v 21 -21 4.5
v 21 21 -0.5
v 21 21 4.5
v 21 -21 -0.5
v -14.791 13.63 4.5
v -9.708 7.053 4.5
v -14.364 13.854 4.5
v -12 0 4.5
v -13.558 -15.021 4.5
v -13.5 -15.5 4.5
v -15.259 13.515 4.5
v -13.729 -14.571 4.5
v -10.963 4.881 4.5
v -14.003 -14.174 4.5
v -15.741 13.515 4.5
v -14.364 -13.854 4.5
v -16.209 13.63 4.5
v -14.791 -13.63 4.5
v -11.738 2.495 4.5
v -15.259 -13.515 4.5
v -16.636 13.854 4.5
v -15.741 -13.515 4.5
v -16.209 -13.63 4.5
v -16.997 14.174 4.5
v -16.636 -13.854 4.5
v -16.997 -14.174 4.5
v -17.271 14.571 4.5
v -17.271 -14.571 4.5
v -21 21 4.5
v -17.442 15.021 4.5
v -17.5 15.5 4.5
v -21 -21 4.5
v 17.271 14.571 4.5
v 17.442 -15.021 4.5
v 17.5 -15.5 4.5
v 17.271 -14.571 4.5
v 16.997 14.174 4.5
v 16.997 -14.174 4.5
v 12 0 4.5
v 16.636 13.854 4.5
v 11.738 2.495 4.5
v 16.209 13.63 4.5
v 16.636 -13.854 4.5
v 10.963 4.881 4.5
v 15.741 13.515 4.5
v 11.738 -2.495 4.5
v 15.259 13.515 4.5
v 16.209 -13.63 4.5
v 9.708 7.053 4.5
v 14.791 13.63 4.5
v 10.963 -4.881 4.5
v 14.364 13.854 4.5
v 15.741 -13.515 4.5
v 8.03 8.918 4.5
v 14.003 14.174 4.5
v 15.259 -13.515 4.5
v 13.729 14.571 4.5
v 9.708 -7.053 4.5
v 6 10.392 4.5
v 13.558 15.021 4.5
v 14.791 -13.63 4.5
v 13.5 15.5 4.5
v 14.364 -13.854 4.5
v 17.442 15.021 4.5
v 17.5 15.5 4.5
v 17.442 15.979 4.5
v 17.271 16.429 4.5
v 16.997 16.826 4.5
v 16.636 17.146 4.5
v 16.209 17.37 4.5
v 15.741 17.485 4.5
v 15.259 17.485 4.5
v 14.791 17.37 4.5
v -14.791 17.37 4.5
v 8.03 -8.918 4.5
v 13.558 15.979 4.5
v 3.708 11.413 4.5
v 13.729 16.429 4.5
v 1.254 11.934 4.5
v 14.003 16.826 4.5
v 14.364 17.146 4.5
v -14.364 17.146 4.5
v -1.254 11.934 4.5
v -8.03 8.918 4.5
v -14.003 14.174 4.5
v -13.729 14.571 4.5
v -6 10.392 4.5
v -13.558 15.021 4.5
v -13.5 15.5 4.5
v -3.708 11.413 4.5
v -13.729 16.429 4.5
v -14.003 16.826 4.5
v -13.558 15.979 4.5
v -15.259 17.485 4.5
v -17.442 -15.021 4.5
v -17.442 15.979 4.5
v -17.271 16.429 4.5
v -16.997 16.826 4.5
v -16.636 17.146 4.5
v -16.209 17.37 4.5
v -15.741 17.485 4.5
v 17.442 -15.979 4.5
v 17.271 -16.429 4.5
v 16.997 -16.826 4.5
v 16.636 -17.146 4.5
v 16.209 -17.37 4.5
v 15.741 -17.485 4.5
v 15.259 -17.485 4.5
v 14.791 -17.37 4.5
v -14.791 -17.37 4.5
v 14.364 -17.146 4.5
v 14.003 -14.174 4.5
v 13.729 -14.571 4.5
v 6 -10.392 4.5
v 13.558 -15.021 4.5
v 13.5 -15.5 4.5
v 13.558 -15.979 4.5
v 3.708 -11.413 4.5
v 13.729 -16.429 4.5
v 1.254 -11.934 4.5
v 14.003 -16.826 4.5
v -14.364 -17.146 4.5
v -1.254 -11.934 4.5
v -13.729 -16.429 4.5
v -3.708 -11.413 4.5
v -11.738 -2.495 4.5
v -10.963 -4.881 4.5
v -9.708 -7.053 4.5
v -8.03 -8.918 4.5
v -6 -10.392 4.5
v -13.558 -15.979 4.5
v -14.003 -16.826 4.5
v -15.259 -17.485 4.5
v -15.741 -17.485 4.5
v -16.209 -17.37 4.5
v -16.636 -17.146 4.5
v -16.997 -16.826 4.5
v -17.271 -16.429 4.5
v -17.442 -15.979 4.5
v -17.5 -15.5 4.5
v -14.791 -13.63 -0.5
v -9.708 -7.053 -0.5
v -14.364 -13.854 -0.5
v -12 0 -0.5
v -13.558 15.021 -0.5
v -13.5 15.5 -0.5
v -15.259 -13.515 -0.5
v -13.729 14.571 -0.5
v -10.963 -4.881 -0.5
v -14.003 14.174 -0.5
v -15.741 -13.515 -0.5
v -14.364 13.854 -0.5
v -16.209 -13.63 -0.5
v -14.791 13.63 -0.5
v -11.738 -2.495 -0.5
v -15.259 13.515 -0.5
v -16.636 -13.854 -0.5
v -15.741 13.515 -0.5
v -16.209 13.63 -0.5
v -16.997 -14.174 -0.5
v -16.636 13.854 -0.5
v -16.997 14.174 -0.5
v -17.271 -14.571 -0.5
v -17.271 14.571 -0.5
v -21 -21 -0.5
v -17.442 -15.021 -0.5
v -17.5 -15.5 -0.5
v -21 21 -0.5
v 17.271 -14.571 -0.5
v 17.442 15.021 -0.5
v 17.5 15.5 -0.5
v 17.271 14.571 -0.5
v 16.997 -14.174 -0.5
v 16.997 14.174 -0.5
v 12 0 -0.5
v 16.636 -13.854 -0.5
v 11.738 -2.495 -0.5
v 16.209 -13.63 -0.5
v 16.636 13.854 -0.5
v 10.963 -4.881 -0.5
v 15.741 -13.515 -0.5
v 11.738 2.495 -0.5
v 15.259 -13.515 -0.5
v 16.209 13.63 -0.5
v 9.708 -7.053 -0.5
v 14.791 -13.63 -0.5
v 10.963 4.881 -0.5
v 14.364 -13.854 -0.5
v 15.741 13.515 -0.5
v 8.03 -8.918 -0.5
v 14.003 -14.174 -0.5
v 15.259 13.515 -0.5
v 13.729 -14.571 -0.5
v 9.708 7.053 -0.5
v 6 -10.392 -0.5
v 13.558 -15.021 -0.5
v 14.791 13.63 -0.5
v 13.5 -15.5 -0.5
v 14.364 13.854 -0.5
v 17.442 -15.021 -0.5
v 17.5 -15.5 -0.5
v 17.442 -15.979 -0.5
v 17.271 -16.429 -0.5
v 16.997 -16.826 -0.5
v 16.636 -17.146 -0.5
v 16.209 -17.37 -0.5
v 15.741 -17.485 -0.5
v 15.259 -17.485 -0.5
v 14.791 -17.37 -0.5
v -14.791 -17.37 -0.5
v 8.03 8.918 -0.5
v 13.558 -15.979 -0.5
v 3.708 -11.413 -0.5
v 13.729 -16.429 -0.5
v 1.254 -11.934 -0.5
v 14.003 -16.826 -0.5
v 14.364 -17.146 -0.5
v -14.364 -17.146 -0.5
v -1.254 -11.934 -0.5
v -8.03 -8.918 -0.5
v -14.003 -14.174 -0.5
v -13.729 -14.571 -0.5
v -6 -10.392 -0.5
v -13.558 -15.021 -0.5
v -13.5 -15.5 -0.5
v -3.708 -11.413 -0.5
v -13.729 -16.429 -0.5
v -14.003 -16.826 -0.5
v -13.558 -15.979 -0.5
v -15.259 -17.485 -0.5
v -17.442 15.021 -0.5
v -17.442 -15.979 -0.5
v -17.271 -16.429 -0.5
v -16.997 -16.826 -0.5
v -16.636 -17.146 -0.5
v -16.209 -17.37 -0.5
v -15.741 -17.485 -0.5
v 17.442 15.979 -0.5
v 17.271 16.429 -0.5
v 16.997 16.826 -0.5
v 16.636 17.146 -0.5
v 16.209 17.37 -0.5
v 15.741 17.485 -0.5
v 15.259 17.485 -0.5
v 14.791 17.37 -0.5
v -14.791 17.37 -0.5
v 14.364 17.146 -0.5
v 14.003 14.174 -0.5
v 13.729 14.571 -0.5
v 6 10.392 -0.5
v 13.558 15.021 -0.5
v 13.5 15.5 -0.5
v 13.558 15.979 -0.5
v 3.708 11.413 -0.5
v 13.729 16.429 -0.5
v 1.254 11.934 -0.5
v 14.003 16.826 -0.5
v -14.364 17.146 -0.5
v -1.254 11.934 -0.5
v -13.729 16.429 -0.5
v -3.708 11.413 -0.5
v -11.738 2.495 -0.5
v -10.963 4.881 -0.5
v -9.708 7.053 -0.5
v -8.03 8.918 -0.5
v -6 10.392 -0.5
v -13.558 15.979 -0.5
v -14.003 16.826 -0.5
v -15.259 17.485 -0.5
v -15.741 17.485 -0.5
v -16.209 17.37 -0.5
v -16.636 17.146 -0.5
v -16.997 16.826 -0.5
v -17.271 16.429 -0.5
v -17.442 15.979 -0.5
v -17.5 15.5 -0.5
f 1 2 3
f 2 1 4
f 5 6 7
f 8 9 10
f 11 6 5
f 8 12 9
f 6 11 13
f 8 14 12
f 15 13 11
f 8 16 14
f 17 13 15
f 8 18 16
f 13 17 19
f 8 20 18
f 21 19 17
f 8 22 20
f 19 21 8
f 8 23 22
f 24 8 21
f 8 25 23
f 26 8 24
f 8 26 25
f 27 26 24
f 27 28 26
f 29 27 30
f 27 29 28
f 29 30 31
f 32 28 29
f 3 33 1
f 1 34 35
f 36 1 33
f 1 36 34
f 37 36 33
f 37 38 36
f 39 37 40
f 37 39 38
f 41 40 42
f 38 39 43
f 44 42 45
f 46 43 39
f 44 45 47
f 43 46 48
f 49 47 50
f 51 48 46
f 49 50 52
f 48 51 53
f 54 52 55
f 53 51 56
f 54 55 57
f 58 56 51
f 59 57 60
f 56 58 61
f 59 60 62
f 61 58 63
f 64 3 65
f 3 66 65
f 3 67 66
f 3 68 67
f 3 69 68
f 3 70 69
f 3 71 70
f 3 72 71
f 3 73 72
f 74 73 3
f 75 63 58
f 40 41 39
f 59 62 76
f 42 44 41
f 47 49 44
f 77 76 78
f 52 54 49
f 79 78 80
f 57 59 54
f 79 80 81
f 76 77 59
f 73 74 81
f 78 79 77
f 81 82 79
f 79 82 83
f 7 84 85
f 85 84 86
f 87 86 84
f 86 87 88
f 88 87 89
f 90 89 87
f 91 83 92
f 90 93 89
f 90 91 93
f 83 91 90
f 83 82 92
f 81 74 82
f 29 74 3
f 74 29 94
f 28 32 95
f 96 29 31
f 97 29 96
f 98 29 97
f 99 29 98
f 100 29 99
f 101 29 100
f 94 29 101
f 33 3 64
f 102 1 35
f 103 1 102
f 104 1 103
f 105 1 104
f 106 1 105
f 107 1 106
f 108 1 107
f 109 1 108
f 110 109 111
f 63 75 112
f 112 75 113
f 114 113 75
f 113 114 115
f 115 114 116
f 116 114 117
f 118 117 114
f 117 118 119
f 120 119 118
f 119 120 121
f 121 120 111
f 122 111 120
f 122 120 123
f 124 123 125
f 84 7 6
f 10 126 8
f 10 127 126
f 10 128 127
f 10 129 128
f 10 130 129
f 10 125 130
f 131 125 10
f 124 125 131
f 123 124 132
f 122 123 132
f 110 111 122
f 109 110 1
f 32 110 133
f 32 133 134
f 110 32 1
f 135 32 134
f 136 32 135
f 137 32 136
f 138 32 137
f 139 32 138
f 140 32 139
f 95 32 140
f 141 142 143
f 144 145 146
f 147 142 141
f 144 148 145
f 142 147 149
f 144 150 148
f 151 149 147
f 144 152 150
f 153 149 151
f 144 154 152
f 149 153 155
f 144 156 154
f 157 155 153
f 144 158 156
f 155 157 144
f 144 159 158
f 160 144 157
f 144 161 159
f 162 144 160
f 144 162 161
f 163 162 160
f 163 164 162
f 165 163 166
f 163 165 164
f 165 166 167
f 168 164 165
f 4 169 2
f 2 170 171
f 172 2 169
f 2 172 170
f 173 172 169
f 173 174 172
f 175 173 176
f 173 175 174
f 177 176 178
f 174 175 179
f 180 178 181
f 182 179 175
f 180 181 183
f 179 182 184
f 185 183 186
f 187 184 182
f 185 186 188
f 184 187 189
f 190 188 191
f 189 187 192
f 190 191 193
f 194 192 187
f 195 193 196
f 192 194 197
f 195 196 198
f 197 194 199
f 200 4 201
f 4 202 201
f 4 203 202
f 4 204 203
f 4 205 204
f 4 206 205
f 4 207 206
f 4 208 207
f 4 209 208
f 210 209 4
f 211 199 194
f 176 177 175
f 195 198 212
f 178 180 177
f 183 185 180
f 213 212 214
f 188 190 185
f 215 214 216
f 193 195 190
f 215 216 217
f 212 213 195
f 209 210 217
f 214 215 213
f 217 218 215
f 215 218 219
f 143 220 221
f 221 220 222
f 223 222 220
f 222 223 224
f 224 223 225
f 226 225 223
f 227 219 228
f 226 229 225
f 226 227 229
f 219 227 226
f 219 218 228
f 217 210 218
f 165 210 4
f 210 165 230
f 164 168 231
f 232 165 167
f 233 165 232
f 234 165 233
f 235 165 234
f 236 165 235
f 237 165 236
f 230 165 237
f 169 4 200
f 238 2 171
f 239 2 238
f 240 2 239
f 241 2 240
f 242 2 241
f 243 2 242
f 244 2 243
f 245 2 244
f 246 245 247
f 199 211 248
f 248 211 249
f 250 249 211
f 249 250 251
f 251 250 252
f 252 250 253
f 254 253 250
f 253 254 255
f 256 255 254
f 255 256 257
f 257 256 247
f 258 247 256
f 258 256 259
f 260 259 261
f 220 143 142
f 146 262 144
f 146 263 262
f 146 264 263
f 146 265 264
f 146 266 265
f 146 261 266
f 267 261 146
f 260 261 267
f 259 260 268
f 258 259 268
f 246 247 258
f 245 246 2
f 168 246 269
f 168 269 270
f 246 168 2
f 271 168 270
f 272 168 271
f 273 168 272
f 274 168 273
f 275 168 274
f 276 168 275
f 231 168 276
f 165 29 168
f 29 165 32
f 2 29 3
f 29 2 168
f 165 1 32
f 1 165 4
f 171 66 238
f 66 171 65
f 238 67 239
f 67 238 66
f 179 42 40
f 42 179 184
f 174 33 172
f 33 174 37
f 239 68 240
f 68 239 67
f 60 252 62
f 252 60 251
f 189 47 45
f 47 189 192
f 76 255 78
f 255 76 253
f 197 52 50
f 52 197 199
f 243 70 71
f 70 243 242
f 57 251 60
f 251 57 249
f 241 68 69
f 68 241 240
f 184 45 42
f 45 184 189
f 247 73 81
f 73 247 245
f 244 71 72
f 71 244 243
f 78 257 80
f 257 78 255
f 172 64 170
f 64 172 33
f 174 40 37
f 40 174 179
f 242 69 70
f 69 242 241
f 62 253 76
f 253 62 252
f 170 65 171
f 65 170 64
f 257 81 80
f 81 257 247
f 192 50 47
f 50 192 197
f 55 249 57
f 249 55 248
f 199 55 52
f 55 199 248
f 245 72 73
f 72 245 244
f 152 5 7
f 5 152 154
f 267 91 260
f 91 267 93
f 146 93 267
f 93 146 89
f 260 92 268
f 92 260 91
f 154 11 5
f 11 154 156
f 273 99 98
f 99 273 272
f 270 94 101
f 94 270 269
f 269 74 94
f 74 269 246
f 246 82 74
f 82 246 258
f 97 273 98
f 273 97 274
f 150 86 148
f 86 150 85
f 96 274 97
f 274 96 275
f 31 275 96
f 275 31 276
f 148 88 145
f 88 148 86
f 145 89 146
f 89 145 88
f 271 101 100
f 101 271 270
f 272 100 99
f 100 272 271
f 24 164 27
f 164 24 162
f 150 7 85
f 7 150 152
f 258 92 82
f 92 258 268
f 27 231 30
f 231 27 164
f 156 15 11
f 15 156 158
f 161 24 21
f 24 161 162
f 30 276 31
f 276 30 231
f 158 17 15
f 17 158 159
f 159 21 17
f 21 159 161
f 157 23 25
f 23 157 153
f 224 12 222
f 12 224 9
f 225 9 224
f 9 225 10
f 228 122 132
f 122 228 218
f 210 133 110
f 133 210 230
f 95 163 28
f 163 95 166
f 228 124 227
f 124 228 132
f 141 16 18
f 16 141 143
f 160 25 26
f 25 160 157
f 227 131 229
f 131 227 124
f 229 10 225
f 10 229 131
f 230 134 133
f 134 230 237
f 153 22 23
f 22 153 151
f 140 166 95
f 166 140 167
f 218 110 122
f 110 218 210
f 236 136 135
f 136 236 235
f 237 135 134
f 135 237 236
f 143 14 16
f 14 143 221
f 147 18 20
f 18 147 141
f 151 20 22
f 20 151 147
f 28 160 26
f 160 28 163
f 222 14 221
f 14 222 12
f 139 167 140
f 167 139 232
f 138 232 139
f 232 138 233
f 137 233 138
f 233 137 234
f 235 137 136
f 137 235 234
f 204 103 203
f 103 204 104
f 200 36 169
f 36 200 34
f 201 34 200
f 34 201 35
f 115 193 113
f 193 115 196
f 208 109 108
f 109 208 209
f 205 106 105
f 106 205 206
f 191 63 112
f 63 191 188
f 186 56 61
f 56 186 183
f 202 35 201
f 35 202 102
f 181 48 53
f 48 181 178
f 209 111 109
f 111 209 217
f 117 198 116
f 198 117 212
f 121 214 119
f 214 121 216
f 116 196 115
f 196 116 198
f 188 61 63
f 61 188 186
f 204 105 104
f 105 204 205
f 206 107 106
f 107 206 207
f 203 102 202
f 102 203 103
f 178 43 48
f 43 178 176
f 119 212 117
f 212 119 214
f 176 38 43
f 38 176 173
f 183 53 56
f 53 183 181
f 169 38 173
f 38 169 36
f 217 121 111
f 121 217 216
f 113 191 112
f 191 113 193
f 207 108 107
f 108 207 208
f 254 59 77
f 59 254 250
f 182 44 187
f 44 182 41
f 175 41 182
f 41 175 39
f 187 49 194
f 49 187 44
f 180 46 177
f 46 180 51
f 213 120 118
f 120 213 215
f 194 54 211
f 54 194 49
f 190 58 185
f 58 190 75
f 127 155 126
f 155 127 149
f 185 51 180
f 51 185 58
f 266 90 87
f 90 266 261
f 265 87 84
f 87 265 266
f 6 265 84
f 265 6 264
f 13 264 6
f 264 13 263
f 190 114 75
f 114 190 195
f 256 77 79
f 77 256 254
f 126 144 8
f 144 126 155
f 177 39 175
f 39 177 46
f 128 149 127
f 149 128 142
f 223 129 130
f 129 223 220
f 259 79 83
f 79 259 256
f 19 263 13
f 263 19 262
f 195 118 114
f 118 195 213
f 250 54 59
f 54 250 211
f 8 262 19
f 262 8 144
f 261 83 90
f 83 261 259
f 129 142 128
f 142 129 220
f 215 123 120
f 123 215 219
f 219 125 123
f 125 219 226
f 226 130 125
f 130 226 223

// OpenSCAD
// file: motor_mount.scad
$fs = 0.5;
$tol = 1;

boltLength = 4;
boltOffset = 15.5;
wallThickness = 4;
centerCutout = 22;

module motorMount(width, thickness) {
  // Base plate
  difference() {
    translate([0, 0, wallThickness / 2])
      cube([width, width, thickness], center = true);

    // screw hole mounts
    translate([boltOffset, boltOffset, -1]){
      cylinder(r=boltLength/2, h=wallThickness+2);
    }
    translate([-boltOffset, boltOffset, -1]){
      cylinder(r=boltLength/2, h=wallThickness+2);
    }
    translate([-boltOffset, -boltOffset, -1]){
      cylinder(r=boltLength/2, h=wallThickness+2);
    }
    translate([boltOffset, -boltOffset, -1]){
      cylinder(r=boltLength/2, h=wallThickness+2);
    }

    // Center hole/shaft cutout
    translate([0,0, -$tol]){
      cylinder(r=centerCutout/2 + $tol, h=wallThickness+2);
    }
  }
}

module hangingMount(){
  height = 25;
	supportThickness = 5;
	supportWidth = 10;
	supportHeight = 40;
	railInnerWidth = 15;
	distToRail=60;
	railOuterWidth = 18; //Replace these with real caliper values
	underslungHeight = 20;
	frameWidth = motorWidth;

	supportXOffset = frameWidth/2;
	supportYOffset = -supportWidth/2;

	distToSupportOuter = supportXOffset+supportThickness/2;
	supportAngle = atan(distToRail/distToSupportOuter);
	
	difference(){
		//Stuff to be added to the shape
		union(){
			translate([-frameWidth/2, -frameWidth/2, 0]){
			}
			
			translate([-supportXOffset, 0, wallThickness]){
				rotate([0, 90-supportAngle, 0]){
					cube([supportThickness, supportWidth, supportHeight]);
					translate([-10,0,supportHeight]){
						cube([15,10,5]);
					}
				}
			}
			
			translate([supportXOffset, 0, wallThickness]){
				rotate([0, 90-supportAngle, 180]){
					cube([supportThickness, supportWidth, supportHeight]);
					translate([-10,0,supportHeight]){
						cube([15,10,5]);
					}
				}
			}
		}
	}
	
}

hangingMount();
// main file
use <motor_mount.scad>

ARR = "assembly";
$tol = 1;

motorWidth = 42;
wallThickness = 5;

module blinds() {
  if (ARR == "assembly") {
    motorMount(motorWidth, wallThickness);
  } else {

  }
}

blinds();
